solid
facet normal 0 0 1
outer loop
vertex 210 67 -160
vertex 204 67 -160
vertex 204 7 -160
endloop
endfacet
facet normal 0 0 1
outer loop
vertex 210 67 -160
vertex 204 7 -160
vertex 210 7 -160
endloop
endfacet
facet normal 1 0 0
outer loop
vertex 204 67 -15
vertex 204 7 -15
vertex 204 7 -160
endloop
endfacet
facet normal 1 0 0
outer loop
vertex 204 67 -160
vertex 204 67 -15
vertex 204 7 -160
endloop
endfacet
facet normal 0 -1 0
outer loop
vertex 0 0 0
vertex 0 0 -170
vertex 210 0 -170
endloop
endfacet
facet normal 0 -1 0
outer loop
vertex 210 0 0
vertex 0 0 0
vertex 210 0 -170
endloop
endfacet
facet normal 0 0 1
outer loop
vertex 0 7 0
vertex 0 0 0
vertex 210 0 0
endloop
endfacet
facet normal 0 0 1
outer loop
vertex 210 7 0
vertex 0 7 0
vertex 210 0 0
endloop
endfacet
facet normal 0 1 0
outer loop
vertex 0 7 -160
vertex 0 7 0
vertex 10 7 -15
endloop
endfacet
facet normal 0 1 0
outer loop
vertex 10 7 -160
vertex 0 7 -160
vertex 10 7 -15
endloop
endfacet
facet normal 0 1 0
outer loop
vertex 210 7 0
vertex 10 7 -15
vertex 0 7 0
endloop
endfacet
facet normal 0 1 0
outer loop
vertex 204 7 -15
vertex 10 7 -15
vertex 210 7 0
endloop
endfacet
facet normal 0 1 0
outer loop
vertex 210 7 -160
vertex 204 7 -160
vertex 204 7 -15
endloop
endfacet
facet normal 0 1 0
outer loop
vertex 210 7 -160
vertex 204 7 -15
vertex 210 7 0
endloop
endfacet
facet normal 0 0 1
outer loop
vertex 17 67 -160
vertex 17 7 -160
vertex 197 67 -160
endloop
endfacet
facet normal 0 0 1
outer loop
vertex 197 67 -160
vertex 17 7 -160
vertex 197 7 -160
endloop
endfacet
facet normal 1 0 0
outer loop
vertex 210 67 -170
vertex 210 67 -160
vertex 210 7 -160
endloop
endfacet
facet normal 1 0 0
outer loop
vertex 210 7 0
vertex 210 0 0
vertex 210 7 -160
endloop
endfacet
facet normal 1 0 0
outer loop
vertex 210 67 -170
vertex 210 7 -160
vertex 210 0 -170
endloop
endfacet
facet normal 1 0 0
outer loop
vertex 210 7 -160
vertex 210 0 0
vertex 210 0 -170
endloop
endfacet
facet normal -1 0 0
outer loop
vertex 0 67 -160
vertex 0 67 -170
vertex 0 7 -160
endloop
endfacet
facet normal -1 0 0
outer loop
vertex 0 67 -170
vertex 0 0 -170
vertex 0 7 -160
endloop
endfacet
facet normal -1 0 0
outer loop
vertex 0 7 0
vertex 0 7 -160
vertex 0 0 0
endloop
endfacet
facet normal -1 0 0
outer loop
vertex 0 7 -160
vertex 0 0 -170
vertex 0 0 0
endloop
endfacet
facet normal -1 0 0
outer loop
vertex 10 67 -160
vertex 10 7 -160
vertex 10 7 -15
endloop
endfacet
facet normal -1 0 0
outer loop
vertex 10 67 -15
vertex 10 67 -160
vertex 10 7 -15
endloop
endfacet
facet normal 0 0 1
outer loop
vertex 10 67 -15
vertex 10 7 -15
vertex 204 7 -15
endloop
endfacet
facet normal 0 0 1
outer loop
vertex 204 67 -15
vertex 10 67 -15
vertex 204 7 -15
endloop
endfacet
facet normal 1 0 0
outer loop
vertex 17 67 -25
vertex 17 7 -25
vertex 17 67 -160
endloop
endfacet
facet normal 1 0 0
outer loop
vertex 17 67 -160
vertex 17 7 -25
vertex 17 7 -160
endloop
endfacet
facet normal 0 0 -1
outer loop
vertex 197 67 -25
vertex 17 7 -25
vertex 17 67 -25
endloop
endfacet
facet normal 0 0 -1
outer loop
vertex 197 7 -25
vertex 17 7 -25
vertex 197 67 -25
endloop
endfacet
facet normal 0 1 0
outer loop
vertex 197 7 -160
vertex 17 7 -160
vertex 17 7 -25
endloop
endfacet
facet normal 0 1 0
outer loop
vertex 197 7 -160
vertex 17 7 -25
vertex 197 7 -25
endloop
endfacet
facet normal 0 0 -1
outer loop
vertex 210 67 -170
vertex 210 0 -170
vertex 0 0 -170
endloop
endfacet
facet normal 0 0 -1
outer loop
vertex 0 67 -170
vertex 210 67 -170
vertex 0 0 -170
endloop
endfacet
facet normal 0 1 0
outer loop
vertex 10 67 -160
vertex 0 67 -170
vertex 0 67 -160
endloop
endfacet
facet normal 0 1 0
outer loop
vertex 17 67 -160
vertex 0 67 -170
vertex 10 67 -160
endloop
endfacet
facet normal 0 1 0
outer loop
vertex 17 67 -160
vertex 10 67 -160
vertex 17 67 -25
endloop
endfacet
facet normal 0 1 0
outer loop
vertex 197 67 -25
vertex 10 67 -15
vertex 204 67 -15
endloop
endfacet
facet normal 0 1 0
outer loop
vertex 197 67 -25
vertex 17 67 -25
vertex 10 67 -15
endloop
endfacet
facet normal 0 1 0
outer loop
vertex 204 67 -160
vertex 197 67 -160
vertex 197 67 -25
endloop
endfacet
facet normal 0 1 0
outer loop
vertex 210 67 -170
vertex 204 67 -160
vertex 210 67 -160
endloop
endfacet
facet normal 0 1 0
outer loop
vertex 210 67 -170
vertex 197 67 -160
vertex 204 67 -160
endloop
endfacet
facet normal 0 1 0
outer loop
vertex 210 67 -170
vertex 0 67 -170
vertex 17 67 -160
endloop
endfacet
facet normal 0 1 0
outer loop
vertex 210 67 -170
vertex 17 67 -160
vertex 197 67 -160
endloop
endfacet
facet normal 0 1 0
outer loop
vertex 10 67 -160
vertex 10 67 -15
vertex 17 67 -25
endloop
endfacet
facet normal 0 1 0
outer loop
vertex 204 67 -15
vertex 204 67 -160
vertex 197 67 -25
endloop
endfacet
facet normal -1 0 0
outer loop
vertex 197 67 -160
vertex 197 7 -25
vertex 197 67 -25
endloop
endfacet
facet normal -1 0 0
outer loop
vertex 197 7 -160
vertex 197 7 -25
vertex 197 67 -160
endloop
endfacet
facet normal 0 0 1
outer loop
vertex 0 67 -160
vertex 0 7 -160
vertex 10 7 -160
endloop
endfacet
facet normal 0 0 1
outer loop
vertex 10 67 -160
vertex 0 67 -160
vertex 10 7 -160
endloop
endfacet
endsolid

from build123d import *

# Parameters (mm, degrees)
SKETCH1_W           = 210
SKETCH1_H           = 170
BOSS_EXTRUDE1_DEPTH = 7
SKETCH2_W           = 180
SKETCH2_H           = 135
BOSS_EXTRUDE2_DEPTH = 60


with BuildPart() as part:
    # Sketch1 → Boss-Extrude1 (new body)
    with BuildSketch(Plane(origin=(0, 0, 0), x_dir=(1, 0, 0), z_dir=(0, 1, 0))):
        with Locations((105, 85)):
            Rectangle(SKETCH1_W, SKETCH1_H)
    extrude(amount=BOSS_EXTRUDE1_DEPTH)

    # Sketch2 → Boss-Extrude2 (add)
    with BuildSketch(Plane(origin=(0, 7, 0), x_dir=(1, 0, 0), z_dir=(0, 1, 0))):
        Polygon((210, 170), (0, 170), (0, 160), (10, 160), (10, 25), (10, 20.500436989), (10, 15), (204, 15), (204, 18.199432026), (204, 25), (204, 160), (210, 160), align=None)
        with Locations((107, 92.5)):
            Rectangle(SKETCH2_W, SKETCH2_H, mode=Mode.SUBTRACT)
    extrude(amount=BOSS_EXTRUDE2_DEPTH)


solid = part.part
